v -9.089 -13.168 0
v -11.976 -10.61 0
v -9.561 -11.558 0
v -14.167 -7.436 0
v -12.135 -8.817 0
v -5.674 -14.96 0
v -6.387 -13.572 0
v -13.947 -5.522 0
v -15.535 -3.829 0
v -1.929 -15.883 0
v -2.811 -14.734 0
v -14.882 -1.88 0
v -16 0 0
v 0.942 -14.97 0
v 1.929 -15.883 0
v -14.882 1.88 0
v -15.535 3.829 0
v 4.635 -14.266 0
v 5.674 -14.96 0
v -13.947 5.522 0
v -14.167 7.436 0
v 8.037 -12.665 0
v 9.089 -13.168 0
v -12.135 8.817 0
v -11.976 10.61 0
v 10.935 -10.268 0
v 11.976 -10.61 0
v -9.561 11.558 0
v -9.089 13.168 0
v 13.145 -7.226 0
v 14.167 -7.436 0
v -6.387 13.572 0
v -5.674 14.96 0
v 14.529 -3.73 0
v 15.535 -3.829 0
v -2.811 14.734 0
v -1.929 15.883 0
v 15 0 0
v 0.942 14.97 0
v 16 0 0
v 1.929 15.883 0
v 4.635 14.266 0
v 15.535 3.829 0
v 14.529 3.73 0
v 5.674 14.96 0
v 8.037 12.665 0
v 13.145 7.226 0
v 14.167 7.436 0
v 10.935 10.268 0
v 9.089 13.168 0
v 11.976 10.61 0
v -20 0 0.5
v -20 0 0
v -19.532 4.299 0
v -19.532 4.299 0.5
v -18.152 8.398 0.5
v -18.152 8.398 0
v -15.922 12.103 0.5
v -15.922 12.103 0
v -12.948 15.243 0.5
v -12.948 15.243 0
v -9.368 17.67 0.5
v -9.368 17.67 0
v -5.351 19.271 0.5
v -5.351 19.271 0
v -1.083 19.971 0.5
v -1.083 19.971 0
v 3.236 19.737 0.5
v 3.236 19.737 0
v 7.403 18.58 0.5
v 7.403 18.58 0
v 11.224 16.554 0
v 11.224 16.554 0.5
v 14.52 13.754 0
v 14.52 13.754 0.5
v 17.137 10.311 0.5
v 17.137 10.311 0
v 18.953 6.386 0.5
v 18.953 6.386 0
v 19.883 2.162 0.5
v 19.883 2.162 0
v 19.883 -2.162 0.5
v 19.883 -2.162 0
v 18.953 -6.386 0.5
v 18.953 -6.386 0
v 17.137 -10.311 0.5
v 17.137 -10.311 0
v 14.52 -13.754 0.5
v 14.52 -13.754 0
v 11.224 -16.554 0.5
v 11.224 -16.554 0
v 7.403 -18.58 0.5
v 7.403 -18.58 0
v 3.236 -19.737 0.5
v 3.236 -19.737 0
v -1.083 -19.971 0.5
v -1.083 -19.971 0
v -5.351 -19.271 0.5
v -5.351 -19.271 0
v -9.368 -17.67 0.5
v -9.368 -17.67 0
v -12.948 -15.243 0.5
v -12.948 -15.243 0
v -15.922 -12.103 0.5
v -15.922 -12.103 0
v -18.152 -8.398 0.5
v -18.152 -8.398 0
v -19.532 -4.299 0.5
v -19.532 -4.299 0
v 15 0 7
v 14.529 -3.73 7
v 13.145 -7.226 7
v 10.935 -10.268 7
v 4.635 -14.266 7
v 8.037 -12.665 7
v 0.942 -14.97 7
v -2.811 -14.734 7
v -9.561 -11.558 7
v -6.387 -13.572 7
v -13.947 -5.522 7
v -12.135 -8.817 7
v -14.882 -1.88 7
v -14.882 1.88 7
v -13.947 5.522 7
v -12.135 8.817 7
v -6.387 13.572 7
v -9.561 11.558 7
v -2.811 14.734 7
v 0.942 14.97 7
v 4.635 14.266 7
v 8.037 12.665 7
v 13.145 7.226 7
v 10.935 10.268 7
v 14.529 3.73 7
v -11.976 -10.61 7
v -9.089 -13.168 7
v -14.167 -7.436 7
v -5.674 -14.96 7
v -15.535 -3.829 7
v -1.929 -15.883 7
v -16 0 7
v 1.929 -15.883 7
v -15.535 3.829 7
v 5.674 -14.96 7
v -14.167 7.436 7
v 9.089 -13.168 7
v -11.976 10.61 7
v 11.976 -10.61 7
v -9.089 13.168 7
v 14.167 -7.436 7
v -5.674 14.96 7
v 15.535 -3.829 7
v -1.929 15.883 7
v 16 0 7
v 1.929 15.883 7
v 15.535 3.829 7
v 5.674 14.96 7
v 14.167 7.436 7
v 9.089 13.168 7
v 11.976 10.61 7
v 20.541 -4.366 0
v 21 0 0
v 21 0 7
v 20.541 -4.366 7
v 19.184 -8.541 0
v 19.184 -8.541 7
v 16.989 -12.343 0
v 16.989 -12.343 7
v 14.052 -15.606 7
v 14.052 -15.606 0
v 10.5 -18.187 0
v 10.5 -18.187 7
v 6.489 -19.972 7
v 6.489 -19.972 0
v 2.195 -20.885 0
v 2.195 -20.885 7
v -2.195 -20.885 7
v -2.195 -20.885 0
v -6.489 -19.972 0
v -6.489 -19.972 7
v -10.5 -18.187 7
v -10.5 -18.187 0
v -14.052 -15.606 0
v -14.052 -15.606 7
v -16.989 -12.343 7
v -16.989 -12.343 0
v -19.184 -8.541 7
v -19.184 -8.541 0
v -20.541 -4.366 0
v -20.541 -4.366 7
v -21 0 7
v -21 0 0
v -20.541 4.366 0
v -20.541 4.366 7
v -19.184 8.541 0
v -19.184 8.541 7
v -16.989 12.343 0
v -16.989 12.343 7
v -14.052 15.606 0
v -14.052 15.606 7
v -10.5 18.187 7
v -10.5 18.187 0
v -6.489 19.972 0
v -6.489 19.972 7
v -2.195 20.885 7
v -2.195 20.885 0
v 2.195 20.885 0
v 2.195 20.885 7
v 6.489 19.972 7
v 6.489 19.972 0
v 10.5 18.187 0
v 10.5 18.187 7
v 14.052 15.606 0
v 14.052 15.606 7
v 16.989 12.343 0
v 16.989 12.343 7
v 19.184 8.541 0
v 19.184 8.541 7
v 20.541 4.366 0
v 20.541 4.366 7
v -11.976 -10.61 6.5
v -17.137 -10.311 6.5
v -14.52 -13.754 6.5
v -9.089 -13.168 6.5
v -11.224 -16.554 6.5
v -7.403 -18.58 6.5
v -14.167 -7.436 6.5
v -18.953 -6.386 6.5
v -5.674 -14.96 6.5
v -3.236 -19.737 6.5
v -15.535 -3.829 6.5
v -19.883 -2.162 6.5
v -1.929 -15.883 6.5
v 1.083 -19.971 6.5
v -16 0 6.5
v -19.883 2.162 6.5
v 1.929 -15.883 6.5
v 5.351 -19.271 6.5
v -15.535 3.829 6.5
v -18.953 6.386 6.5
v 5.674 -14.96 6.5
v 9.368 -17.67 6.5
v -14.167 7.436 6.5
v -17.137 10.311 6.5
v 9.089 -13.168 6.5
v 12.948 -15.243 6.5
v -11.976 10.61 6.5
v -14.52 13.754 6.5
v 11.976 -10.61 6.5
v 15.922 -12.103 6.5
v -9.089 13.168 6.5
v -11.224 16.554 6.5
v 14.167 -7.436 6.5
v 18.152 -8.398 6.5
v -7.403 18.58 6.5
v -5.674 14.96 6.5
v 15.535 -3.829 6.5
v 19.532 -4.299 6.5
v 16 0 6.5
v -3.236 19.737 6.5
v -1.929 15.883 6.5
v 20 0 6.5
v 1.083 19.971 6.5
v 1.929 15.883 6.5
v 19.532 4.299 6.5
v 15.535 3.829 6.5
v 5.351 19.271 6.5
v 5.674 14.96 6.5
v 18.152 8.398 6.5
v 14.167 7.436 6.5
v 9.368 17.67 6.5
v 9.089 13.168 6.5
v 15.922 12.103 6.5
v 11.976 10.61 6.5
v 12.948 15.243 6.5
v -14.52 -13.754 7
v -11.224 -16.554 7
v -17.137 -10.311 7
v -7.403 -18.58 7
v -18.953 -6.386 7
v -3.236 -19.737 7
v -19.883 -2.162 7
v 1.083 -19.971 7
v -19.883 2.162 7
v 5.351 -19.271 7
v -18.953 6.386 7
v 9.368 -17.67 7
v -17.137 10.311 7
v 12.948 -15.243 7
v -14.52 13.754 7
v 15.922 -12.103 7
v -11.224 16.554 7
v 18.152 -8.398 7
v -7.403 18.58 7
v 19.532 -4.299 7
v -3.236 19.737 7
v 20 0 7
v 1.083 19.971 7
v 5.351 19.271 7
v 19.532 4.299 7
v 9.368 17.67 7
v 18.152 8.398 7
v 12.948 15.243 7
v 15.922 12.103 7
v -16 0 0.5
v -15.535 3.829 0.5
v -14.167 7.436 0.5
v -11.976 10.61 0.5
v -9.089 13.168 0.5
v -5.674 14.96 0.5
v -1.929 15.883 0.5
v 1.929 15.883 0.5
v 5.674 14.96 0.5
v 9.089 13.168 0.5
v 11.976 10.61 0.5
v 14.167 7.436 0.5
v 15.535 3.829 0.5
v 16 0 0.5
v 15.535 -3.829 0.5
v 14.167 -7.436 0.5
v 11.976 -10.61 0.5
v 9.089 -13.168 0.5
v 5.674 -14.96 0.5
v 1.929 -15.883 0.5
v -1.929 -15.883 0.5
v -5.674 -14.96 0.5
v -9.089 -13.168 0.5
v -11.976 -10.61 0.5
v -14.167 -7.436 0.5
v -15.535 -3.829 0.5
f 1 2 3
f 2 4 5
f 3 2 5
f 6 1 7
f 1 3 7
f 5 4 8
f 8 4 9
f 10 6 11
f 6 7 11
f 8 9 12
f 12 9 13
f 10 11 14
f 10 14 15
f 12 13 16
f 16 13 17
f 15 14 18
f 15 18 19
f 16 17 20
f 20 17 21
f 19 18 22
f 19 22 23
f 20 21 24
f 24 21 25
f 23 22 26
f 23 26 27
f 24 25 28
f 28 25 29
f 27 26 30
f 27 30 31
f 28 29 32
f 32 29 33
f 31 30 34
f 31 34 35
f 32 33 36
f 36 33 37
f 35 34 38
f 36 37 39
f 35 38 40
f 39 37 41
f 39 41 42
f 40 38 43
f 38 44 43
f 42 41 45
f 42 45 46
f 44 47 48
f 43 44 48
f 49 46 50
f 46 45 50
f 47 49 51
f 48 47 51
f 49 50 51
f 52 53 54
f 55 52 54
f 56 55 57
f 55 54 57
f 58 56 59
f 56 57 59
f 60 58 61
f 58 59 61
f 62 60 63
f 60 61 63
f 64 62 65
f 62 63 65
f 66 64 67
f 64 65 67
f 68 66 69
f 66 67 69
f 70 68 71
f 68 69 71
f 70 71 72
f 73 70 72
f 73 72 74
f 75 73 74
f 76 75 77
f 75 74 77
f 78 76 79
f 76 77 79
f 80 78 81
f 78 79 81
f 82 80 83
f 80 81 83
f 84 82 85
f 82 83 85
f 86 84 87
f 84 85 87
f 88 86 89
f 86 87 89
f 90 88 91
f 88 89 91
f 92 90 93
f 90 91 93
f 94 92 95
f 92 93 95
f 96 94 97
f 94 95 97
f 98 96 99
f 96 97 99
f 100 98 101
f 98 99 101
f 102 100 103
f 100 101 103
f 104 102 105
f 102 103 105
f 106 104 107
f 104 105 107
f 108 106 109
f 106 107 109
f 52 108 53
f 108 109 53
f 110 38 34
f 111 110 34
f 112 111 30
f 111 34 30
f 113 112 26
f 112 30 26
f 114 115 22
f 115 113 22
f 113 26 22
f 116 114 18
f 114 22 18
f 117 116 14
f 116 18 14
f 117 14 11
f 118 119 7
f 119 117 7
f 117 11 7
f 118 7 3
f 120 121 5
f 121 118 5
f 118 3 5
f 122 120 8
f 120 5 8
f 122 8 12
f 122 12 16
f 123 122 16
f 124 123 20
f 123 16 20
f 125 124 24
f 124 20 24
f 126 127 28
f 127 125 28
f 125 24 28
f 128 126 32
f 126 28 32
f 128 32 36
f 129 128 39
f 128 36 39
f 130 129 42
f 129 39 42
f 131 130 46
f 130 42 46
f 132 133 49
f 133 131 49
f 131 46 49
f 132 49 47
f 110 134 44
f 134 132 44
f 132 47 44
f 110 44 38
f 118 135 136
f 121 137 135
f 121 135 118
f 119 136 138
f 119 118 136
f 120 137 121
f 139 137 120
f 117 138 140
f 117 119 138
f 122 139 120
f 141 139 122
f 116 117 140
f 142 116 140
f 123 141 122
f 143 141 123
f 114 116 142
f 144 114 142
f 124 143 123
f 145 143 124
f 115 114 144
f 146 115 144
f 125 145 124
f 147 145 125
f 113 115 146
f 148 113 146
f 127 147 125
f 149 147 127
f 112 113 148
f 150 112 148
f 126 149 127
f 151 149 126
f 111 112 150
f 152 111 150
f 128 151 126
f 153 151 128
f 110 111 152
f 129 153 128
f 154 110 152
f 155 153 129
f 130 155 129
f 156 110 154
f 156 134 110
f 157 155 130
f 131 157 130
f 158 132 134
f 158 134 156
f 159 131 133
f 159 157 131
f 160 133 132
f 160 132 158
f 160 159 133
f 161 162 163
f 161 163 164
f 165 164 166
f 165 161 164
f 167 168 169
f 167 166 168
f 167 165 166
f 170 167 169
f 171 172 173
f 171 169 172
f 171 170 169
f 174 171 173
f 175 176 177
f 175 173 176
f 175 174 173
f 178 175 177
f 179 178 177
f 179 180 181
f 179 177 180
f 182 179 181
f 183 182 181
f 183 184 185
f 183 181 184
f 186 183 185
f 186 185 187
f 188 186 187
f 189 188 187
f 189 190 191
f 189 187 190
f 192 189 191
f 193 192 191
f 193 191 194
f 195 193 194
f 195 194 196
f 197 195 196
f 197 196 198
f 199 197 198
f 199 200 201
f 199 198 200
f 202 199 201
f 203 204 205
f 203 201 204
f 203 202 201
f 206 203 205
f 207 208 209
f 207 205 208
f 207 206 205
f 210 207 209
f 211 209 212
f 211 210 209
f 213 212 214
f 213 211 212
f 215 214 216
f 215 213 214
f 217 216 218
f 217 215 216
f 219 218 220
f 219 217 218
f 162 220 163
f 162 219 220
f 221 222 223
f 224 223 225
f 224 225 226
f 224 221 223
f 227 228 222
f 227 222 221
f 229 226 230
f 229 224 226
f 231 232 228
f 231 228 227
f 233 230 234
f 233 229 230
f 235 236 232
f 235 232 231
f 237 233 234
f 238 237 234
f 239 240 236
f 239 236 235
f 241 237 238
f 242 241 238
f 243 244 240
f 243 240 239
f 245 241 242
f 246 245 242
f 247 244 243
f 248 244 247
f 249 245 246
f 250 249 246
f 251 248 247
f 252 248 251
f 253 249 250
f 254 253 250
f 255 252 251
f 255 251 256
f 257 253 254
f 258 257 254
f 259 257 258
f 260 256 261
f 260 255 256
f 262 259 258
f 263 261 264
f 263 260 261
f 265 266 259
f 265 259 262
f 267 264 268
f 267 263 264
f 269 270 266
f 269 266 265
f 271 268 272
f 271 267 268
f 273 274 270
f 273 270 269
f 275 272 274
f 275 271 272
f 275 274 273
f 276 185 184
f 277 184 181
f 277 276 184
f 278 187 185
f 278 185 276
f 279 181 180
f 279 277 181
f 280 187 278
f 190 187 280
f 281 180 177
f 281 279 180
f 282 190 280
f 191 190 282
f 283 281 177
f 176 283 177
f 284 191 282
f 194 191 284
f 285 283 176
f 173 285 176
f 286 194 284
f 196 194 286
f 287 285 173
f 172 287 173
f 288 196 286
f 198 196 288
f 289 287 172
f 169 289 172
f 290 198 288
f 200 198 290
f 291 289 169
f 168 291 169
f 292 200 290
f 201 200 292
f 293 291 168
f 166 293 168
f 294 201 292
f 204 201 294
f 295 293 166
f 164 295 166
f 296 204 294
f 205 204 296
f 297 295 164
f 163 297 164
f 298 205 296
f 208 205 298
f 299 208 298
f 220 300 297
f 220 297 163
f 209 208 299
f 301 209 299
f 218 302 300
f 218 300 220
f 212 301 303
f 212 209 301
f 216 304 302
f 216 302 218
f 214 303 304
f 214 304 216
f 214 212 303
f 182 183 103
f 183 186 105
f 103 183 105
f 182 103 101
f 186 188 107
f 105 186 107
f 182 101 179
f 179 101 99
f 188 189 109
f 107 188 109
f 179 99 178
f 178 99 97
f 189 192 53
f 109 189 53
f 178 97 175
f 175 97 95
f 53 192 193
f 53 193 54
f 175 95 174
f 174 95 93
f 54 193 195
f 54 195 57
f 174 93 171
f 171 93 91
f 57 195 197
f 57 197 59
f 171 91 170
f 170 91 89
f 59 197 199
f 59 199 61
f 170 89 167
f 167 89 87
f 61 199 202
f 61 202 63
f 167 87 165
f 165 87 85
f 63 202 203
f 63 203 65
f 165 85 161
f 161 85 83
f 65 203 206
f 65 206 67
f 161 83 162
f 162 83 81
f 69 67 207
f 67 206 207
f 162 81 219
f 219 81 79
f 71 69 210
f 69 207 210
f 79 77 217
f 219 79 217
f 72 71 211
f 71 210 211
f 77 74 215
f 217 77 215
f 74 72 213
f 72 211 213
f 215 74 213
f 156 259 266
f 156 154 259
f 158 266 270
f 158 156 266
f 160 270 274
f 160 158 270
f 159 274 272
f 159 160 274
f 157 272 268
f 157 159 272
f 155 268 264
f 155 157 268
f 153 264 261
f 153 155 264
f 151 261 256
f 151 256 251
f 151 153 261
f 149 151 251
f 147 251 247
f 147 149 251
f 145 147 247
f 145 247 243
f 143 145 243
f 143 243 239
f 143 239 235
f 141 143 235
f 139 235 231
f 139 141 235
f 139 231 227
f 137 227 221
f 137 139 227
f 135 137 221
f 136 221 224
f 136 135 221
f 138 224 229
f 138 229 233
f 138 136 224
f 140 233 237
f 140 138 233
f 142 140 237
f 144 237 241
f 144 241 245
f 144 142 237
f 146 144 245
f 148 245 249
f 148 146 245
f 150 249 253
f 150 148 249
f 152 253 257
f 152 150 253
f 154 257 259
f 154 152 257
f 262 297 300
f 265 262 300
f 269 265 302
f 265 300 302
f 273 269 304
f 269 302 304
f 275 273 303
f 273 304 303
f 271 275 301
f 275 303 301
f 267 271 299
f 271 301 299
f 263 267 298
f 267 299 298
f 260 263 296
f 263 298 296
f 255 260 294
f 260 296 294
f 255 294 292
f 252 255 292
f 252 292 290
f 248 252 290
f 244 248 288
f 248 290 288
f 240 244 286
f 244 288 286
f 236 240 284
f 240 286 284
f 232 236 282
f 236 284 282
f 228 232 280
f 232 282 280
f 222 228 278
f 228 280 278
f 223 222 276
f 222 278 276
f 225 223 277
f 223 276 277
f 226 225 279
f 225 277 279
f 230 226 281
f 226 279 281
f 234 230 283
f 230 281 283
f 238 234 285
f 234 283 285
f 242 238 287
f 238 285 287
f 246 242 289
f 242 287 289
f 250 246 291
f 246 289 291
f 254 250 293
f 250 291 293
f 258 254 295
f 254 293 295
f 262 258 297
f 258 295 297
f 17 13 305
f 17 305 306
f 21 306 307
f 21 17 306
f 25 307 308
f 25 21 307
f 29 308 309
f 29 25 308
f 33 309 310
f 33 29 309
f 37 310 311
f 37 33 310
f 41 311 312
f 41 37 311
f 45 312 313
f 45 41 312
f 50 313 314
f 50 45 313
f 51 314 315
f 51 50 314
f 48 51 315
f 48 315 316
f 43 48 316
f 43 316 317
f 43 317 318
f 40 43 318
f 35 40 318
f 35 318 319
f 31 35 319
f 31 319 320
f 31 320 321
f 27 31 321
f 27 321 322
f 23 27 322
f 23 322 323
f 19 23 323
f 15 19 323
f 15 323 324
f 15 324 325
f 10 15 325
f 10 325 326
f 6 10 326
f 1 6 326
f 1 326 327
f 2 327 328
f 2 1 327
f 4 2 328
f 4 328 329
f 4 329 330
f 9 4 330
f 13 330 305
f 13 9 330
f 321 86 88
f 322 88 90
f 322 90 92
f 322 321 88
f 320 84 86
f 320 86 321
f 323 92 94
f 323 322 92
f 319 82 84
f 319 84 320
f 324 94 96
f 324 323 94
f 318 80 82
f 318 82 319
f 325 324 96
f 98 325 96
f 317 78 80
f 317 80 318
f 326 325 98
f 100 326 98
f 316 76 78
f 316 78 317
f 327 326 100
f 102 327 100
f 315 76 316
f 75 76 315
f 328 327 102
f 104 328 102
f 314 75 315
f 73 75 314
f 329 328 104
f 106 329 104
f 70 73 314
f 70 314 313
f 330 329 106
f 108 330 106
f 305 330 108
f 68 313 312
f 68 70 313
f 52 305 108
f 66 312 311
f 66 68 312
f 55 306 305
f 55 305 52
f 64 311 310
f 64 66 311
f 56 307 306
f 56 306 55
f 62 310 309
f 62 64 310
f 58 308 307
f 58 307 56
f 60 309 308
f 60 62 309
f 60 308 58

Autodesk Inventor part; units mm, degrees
ref_plane "YZ Plane" through (0, 0, 0) normal (1, 0, 0) x (0, 1, 0)
ref_plane "XZ Plane" through (0, 0, 0) normal (0, 1, 0) x (-1, 0, 0)
ref_plane "XY Plane" through (0, 0, 0) normal (0, 0, 1) x (1, 0, 0)
sketch "Sketch1" plane through (0, 0, 0) normal (0, 0, 1) x (1, 0, 0)
  circle A0 centre (0, 0) radius 21
  circle A1 centre (0, 0) radius 15
  dimension "d0" = 42
  dimension "d1" = 30
extrude "Extrusion1" add sketch "Sketch1" along normal blind 7
sketch "Sketch2" plane through (0, 0, 7) normal (0, 0, 1) x (1, 0, 0)
  circle A0 centre (0, 0) radius 21 projected
  circle A1 centre (0, 0) radius 15 projected
  circle A2 centre (0, 0) radius 20
  circle A3 centre (0, 0) radius 16
  dimension "d4" = 1
  dimension "d5" = 1
extrude "Extrusion2" cut sketch "Sketch2" against normal blind 0.5 contours A2
sketch "Sketch3" plane through (0, 0, 0) normal (0, 0, -1) x (-1, 0, 0)
  circle A0 centre (0, 0) radius 20 projected
  circle A1 centre (0, 0) radius 16 projected
extrude "Extrusion3" cut sketch "Sketch3" against normal blind 0.5
properties part number "bearing_42x30x7"
